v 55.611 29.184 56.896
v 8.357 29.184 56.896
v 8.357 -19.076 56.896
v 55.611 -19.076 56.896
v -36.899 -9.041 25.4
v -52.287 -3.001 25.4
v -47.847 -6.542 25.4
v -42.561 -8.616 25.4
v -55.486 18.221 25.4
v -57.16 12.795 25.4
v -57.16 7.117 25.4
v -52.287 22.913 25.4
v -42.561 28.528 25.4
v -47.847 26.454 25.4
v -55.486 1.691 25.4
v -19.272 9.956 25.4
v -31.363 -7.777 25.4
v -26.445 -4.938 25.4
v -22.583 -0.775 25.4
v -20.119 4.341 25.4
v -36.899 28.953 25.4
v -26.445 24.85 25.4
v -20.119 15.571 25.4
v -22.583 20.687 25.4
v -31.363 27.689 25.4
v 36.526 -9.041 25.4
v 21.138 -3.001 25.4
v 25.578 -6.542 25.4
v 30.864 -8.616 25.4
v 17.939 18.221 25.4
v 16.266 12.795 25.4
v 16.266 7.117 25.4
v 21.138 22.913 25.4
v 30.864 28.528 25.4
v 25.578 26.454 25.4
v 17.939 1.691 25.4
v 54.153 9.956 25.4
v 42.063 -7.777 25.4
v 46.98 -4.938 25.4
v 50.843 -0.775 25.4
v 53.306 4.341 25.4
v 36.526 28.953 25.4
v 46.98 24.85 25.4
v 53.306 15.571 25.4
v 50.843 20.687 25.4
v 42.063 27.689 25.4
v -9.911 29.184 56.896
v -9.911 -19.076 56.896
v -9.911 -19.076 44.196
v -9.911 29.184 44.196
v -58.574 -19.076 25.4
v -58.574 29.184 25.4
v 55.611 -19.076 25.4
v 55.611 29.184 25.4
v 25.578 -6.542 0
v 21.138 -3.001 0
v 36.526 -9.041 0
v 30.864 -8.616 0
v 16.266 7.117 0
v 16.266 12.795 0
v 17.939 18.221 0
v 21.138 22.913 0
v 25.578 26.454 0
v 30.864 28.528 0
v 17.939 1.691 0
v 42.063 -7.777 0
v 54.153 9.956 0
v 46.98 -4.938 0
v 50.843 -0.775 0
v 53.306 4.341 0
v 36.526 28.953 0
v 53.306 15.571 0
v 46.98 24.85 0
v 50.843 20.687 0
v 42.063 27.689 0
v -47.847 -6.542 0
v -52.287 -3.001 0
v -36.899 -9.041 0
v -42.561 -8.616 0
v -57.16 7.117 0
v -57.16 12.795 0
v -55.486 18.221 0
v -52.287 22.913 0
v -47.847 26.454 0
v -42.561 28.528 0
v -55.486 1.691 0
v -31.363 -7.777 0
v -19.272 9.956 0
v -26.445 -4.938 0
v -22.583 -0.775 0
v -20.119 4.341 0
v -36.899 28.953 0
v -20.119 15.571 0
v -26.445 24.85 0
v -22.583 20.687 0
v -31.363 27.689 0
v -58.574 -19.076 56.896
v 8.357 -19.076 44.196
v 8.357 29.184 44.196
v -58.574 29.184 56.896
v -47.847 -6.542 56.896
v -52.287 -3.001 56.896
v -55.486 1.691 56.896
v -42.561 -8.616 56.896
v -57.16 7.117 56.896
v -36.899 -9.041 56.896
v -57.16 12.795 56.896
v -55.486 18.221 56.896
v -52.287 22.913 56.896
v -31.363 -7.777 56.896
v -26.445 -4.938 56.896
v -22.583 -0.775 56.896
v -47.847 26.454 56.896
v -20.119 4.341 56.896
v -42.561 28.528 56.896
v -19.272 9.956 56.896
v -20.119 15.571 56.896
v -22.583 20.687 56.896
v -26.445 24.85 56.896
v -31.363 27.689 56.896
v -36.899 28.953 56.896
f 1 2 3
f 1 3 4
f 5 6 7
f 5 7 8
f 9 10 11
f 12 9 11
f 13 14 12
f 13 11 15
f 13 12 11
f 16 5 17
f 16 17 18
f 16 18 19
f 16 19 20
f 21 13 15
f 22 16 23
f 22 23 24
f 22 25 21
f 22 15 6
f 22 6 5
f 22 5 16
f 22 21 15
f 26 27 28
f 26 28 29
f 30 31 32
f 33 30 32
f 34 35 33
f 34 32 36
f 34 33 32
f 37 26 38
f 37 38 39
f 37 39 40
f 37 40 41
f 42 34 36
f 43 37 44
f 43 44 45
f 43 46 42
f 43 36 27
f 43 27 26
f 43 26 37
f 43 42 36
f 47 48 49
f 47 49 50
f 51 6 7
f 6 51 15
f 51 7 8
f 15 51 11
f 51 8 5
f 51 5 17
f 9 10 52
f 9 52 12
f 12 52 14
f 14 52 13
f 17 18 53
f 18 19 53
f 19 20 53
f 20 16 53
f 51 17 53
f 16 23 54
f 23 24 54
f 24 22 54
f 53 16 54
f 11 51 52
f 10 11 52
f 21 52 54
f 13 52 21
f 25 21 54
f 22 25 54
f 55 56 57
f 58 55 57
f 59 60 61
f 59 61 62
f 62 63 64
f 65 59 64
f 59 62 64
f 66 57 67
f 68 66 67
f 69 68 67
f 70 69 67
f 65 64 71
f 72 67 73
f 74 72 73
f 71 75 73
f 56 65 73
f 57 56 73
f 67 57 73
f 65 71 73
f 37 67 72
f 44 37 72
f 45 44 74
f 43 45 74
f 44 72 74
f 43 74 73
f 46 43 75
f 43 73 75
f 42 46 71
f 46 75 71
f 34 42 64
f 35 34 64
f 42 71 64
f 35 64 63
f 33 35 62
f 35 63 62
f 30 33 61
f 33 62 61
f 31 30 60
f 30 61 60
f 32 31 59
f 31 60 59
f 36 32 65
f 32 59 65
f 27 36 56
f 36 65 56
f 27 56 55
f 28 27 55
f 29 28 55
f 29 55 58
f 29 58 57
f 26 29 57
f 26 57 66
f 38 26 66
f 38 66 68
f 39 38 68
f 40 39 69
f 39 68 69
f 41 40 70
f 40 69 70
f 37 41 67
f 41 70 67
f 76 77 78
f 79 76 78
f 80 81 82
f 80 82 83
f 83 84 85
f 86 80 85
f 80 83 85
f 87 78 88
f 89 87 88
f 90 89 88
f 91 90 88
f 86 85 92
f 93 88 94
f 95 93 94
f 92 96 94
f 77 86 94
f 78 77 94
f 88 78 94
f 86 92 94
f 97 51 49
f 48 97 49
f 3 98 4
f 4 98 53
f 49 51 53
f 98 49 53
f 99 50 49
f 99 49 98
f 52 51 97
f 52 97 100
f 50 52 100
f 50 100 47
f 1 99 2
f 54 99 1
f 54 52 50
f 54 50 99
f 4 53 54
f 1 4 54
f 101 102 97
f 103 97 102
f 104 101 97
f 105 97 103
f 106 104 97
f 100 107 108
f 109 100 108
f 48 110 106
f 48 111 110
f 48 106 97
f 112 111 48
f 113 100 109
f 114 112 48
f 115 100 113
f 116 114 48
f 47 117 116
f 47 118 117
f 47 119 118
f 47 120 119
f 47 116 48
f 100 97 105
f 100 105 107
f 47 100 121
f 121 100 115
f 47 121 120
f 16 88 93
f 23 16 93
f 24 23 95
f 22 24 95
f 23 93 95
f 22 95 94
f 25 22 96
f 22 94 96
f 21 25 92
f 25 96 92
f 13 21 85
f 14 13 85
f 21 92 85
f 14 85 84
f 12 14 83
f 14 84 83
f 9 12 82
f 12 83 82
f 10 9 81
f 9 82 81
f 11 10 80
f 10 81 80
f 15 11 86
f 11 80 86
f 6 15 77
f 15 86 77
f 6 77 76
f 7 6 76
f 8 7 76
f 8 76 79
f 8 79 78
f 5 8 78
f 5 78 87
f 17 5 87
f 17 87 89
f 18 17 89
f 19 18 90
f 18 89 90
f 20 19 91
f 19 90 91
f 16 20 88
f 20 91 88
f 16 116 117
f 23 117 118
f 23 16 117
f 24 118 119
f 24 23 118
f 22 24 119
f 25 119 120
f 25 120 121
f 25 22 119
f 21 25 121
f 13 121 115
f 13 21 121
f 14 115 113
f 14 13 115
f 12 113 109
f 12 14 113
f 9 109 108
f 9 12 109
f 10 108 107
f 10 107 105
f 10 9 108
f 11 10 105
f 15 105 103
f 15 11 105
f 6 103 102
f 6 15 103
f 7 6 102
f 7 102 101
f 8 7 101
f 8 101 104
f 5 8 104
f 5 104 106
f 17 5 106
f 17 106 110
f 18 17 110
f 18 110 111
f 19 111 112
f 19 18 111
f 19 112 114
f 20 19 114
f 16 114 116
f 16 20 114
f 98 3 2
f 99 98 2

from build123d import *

# Parameters (mm, degrees)
F0_R     = 19.05
F1_DEPTH = 25.4
F2_W     = 114.18498
F2_H     = 48.26
F2_R     = 19.05
F3_DEPTH = 31.496
F4_W     = 18.267938
F4_H     = 48.26
F5_DEPTH = 12.7


with BuildPart() as f1:
    # F0 (on Top) → F1 (new body)
    with BuildSketch(Plane.XY):
        with Locations((-38.32242, 9.956002)):
            Circle(F0_R)
        with Locations((35.102775, 9.956002)):
            Circle(F0_R)
    extrude(amount=F1_DEPTH)


with BuildPart() as f3:
    # F2 (on face) → F3 (new body)
    with BuildSketch(Plane.XY.offset(25.4)):
        with Locations((-1.481183, 5.054495)):
            Rectangle(F2_W, F2_H)
        with Locations((-38.32242, 9.956002)):
            Circle(F2_R, mode=Mode.SUBTRACT)
    extrude(amount=F3_DEPTH)

    # F4 (on face) → F5 (cut)
    with BuildSketch(Plane.XY.offset(56.896)):
        with Locations((-0.777131, 5.054495)):
            Rectangle(F4_W, F4_H)
    extrude(amount=-F5_DEPTH, mode=Mode.SUBTRACT)


solid = Compound([f1.part, f3.part])
